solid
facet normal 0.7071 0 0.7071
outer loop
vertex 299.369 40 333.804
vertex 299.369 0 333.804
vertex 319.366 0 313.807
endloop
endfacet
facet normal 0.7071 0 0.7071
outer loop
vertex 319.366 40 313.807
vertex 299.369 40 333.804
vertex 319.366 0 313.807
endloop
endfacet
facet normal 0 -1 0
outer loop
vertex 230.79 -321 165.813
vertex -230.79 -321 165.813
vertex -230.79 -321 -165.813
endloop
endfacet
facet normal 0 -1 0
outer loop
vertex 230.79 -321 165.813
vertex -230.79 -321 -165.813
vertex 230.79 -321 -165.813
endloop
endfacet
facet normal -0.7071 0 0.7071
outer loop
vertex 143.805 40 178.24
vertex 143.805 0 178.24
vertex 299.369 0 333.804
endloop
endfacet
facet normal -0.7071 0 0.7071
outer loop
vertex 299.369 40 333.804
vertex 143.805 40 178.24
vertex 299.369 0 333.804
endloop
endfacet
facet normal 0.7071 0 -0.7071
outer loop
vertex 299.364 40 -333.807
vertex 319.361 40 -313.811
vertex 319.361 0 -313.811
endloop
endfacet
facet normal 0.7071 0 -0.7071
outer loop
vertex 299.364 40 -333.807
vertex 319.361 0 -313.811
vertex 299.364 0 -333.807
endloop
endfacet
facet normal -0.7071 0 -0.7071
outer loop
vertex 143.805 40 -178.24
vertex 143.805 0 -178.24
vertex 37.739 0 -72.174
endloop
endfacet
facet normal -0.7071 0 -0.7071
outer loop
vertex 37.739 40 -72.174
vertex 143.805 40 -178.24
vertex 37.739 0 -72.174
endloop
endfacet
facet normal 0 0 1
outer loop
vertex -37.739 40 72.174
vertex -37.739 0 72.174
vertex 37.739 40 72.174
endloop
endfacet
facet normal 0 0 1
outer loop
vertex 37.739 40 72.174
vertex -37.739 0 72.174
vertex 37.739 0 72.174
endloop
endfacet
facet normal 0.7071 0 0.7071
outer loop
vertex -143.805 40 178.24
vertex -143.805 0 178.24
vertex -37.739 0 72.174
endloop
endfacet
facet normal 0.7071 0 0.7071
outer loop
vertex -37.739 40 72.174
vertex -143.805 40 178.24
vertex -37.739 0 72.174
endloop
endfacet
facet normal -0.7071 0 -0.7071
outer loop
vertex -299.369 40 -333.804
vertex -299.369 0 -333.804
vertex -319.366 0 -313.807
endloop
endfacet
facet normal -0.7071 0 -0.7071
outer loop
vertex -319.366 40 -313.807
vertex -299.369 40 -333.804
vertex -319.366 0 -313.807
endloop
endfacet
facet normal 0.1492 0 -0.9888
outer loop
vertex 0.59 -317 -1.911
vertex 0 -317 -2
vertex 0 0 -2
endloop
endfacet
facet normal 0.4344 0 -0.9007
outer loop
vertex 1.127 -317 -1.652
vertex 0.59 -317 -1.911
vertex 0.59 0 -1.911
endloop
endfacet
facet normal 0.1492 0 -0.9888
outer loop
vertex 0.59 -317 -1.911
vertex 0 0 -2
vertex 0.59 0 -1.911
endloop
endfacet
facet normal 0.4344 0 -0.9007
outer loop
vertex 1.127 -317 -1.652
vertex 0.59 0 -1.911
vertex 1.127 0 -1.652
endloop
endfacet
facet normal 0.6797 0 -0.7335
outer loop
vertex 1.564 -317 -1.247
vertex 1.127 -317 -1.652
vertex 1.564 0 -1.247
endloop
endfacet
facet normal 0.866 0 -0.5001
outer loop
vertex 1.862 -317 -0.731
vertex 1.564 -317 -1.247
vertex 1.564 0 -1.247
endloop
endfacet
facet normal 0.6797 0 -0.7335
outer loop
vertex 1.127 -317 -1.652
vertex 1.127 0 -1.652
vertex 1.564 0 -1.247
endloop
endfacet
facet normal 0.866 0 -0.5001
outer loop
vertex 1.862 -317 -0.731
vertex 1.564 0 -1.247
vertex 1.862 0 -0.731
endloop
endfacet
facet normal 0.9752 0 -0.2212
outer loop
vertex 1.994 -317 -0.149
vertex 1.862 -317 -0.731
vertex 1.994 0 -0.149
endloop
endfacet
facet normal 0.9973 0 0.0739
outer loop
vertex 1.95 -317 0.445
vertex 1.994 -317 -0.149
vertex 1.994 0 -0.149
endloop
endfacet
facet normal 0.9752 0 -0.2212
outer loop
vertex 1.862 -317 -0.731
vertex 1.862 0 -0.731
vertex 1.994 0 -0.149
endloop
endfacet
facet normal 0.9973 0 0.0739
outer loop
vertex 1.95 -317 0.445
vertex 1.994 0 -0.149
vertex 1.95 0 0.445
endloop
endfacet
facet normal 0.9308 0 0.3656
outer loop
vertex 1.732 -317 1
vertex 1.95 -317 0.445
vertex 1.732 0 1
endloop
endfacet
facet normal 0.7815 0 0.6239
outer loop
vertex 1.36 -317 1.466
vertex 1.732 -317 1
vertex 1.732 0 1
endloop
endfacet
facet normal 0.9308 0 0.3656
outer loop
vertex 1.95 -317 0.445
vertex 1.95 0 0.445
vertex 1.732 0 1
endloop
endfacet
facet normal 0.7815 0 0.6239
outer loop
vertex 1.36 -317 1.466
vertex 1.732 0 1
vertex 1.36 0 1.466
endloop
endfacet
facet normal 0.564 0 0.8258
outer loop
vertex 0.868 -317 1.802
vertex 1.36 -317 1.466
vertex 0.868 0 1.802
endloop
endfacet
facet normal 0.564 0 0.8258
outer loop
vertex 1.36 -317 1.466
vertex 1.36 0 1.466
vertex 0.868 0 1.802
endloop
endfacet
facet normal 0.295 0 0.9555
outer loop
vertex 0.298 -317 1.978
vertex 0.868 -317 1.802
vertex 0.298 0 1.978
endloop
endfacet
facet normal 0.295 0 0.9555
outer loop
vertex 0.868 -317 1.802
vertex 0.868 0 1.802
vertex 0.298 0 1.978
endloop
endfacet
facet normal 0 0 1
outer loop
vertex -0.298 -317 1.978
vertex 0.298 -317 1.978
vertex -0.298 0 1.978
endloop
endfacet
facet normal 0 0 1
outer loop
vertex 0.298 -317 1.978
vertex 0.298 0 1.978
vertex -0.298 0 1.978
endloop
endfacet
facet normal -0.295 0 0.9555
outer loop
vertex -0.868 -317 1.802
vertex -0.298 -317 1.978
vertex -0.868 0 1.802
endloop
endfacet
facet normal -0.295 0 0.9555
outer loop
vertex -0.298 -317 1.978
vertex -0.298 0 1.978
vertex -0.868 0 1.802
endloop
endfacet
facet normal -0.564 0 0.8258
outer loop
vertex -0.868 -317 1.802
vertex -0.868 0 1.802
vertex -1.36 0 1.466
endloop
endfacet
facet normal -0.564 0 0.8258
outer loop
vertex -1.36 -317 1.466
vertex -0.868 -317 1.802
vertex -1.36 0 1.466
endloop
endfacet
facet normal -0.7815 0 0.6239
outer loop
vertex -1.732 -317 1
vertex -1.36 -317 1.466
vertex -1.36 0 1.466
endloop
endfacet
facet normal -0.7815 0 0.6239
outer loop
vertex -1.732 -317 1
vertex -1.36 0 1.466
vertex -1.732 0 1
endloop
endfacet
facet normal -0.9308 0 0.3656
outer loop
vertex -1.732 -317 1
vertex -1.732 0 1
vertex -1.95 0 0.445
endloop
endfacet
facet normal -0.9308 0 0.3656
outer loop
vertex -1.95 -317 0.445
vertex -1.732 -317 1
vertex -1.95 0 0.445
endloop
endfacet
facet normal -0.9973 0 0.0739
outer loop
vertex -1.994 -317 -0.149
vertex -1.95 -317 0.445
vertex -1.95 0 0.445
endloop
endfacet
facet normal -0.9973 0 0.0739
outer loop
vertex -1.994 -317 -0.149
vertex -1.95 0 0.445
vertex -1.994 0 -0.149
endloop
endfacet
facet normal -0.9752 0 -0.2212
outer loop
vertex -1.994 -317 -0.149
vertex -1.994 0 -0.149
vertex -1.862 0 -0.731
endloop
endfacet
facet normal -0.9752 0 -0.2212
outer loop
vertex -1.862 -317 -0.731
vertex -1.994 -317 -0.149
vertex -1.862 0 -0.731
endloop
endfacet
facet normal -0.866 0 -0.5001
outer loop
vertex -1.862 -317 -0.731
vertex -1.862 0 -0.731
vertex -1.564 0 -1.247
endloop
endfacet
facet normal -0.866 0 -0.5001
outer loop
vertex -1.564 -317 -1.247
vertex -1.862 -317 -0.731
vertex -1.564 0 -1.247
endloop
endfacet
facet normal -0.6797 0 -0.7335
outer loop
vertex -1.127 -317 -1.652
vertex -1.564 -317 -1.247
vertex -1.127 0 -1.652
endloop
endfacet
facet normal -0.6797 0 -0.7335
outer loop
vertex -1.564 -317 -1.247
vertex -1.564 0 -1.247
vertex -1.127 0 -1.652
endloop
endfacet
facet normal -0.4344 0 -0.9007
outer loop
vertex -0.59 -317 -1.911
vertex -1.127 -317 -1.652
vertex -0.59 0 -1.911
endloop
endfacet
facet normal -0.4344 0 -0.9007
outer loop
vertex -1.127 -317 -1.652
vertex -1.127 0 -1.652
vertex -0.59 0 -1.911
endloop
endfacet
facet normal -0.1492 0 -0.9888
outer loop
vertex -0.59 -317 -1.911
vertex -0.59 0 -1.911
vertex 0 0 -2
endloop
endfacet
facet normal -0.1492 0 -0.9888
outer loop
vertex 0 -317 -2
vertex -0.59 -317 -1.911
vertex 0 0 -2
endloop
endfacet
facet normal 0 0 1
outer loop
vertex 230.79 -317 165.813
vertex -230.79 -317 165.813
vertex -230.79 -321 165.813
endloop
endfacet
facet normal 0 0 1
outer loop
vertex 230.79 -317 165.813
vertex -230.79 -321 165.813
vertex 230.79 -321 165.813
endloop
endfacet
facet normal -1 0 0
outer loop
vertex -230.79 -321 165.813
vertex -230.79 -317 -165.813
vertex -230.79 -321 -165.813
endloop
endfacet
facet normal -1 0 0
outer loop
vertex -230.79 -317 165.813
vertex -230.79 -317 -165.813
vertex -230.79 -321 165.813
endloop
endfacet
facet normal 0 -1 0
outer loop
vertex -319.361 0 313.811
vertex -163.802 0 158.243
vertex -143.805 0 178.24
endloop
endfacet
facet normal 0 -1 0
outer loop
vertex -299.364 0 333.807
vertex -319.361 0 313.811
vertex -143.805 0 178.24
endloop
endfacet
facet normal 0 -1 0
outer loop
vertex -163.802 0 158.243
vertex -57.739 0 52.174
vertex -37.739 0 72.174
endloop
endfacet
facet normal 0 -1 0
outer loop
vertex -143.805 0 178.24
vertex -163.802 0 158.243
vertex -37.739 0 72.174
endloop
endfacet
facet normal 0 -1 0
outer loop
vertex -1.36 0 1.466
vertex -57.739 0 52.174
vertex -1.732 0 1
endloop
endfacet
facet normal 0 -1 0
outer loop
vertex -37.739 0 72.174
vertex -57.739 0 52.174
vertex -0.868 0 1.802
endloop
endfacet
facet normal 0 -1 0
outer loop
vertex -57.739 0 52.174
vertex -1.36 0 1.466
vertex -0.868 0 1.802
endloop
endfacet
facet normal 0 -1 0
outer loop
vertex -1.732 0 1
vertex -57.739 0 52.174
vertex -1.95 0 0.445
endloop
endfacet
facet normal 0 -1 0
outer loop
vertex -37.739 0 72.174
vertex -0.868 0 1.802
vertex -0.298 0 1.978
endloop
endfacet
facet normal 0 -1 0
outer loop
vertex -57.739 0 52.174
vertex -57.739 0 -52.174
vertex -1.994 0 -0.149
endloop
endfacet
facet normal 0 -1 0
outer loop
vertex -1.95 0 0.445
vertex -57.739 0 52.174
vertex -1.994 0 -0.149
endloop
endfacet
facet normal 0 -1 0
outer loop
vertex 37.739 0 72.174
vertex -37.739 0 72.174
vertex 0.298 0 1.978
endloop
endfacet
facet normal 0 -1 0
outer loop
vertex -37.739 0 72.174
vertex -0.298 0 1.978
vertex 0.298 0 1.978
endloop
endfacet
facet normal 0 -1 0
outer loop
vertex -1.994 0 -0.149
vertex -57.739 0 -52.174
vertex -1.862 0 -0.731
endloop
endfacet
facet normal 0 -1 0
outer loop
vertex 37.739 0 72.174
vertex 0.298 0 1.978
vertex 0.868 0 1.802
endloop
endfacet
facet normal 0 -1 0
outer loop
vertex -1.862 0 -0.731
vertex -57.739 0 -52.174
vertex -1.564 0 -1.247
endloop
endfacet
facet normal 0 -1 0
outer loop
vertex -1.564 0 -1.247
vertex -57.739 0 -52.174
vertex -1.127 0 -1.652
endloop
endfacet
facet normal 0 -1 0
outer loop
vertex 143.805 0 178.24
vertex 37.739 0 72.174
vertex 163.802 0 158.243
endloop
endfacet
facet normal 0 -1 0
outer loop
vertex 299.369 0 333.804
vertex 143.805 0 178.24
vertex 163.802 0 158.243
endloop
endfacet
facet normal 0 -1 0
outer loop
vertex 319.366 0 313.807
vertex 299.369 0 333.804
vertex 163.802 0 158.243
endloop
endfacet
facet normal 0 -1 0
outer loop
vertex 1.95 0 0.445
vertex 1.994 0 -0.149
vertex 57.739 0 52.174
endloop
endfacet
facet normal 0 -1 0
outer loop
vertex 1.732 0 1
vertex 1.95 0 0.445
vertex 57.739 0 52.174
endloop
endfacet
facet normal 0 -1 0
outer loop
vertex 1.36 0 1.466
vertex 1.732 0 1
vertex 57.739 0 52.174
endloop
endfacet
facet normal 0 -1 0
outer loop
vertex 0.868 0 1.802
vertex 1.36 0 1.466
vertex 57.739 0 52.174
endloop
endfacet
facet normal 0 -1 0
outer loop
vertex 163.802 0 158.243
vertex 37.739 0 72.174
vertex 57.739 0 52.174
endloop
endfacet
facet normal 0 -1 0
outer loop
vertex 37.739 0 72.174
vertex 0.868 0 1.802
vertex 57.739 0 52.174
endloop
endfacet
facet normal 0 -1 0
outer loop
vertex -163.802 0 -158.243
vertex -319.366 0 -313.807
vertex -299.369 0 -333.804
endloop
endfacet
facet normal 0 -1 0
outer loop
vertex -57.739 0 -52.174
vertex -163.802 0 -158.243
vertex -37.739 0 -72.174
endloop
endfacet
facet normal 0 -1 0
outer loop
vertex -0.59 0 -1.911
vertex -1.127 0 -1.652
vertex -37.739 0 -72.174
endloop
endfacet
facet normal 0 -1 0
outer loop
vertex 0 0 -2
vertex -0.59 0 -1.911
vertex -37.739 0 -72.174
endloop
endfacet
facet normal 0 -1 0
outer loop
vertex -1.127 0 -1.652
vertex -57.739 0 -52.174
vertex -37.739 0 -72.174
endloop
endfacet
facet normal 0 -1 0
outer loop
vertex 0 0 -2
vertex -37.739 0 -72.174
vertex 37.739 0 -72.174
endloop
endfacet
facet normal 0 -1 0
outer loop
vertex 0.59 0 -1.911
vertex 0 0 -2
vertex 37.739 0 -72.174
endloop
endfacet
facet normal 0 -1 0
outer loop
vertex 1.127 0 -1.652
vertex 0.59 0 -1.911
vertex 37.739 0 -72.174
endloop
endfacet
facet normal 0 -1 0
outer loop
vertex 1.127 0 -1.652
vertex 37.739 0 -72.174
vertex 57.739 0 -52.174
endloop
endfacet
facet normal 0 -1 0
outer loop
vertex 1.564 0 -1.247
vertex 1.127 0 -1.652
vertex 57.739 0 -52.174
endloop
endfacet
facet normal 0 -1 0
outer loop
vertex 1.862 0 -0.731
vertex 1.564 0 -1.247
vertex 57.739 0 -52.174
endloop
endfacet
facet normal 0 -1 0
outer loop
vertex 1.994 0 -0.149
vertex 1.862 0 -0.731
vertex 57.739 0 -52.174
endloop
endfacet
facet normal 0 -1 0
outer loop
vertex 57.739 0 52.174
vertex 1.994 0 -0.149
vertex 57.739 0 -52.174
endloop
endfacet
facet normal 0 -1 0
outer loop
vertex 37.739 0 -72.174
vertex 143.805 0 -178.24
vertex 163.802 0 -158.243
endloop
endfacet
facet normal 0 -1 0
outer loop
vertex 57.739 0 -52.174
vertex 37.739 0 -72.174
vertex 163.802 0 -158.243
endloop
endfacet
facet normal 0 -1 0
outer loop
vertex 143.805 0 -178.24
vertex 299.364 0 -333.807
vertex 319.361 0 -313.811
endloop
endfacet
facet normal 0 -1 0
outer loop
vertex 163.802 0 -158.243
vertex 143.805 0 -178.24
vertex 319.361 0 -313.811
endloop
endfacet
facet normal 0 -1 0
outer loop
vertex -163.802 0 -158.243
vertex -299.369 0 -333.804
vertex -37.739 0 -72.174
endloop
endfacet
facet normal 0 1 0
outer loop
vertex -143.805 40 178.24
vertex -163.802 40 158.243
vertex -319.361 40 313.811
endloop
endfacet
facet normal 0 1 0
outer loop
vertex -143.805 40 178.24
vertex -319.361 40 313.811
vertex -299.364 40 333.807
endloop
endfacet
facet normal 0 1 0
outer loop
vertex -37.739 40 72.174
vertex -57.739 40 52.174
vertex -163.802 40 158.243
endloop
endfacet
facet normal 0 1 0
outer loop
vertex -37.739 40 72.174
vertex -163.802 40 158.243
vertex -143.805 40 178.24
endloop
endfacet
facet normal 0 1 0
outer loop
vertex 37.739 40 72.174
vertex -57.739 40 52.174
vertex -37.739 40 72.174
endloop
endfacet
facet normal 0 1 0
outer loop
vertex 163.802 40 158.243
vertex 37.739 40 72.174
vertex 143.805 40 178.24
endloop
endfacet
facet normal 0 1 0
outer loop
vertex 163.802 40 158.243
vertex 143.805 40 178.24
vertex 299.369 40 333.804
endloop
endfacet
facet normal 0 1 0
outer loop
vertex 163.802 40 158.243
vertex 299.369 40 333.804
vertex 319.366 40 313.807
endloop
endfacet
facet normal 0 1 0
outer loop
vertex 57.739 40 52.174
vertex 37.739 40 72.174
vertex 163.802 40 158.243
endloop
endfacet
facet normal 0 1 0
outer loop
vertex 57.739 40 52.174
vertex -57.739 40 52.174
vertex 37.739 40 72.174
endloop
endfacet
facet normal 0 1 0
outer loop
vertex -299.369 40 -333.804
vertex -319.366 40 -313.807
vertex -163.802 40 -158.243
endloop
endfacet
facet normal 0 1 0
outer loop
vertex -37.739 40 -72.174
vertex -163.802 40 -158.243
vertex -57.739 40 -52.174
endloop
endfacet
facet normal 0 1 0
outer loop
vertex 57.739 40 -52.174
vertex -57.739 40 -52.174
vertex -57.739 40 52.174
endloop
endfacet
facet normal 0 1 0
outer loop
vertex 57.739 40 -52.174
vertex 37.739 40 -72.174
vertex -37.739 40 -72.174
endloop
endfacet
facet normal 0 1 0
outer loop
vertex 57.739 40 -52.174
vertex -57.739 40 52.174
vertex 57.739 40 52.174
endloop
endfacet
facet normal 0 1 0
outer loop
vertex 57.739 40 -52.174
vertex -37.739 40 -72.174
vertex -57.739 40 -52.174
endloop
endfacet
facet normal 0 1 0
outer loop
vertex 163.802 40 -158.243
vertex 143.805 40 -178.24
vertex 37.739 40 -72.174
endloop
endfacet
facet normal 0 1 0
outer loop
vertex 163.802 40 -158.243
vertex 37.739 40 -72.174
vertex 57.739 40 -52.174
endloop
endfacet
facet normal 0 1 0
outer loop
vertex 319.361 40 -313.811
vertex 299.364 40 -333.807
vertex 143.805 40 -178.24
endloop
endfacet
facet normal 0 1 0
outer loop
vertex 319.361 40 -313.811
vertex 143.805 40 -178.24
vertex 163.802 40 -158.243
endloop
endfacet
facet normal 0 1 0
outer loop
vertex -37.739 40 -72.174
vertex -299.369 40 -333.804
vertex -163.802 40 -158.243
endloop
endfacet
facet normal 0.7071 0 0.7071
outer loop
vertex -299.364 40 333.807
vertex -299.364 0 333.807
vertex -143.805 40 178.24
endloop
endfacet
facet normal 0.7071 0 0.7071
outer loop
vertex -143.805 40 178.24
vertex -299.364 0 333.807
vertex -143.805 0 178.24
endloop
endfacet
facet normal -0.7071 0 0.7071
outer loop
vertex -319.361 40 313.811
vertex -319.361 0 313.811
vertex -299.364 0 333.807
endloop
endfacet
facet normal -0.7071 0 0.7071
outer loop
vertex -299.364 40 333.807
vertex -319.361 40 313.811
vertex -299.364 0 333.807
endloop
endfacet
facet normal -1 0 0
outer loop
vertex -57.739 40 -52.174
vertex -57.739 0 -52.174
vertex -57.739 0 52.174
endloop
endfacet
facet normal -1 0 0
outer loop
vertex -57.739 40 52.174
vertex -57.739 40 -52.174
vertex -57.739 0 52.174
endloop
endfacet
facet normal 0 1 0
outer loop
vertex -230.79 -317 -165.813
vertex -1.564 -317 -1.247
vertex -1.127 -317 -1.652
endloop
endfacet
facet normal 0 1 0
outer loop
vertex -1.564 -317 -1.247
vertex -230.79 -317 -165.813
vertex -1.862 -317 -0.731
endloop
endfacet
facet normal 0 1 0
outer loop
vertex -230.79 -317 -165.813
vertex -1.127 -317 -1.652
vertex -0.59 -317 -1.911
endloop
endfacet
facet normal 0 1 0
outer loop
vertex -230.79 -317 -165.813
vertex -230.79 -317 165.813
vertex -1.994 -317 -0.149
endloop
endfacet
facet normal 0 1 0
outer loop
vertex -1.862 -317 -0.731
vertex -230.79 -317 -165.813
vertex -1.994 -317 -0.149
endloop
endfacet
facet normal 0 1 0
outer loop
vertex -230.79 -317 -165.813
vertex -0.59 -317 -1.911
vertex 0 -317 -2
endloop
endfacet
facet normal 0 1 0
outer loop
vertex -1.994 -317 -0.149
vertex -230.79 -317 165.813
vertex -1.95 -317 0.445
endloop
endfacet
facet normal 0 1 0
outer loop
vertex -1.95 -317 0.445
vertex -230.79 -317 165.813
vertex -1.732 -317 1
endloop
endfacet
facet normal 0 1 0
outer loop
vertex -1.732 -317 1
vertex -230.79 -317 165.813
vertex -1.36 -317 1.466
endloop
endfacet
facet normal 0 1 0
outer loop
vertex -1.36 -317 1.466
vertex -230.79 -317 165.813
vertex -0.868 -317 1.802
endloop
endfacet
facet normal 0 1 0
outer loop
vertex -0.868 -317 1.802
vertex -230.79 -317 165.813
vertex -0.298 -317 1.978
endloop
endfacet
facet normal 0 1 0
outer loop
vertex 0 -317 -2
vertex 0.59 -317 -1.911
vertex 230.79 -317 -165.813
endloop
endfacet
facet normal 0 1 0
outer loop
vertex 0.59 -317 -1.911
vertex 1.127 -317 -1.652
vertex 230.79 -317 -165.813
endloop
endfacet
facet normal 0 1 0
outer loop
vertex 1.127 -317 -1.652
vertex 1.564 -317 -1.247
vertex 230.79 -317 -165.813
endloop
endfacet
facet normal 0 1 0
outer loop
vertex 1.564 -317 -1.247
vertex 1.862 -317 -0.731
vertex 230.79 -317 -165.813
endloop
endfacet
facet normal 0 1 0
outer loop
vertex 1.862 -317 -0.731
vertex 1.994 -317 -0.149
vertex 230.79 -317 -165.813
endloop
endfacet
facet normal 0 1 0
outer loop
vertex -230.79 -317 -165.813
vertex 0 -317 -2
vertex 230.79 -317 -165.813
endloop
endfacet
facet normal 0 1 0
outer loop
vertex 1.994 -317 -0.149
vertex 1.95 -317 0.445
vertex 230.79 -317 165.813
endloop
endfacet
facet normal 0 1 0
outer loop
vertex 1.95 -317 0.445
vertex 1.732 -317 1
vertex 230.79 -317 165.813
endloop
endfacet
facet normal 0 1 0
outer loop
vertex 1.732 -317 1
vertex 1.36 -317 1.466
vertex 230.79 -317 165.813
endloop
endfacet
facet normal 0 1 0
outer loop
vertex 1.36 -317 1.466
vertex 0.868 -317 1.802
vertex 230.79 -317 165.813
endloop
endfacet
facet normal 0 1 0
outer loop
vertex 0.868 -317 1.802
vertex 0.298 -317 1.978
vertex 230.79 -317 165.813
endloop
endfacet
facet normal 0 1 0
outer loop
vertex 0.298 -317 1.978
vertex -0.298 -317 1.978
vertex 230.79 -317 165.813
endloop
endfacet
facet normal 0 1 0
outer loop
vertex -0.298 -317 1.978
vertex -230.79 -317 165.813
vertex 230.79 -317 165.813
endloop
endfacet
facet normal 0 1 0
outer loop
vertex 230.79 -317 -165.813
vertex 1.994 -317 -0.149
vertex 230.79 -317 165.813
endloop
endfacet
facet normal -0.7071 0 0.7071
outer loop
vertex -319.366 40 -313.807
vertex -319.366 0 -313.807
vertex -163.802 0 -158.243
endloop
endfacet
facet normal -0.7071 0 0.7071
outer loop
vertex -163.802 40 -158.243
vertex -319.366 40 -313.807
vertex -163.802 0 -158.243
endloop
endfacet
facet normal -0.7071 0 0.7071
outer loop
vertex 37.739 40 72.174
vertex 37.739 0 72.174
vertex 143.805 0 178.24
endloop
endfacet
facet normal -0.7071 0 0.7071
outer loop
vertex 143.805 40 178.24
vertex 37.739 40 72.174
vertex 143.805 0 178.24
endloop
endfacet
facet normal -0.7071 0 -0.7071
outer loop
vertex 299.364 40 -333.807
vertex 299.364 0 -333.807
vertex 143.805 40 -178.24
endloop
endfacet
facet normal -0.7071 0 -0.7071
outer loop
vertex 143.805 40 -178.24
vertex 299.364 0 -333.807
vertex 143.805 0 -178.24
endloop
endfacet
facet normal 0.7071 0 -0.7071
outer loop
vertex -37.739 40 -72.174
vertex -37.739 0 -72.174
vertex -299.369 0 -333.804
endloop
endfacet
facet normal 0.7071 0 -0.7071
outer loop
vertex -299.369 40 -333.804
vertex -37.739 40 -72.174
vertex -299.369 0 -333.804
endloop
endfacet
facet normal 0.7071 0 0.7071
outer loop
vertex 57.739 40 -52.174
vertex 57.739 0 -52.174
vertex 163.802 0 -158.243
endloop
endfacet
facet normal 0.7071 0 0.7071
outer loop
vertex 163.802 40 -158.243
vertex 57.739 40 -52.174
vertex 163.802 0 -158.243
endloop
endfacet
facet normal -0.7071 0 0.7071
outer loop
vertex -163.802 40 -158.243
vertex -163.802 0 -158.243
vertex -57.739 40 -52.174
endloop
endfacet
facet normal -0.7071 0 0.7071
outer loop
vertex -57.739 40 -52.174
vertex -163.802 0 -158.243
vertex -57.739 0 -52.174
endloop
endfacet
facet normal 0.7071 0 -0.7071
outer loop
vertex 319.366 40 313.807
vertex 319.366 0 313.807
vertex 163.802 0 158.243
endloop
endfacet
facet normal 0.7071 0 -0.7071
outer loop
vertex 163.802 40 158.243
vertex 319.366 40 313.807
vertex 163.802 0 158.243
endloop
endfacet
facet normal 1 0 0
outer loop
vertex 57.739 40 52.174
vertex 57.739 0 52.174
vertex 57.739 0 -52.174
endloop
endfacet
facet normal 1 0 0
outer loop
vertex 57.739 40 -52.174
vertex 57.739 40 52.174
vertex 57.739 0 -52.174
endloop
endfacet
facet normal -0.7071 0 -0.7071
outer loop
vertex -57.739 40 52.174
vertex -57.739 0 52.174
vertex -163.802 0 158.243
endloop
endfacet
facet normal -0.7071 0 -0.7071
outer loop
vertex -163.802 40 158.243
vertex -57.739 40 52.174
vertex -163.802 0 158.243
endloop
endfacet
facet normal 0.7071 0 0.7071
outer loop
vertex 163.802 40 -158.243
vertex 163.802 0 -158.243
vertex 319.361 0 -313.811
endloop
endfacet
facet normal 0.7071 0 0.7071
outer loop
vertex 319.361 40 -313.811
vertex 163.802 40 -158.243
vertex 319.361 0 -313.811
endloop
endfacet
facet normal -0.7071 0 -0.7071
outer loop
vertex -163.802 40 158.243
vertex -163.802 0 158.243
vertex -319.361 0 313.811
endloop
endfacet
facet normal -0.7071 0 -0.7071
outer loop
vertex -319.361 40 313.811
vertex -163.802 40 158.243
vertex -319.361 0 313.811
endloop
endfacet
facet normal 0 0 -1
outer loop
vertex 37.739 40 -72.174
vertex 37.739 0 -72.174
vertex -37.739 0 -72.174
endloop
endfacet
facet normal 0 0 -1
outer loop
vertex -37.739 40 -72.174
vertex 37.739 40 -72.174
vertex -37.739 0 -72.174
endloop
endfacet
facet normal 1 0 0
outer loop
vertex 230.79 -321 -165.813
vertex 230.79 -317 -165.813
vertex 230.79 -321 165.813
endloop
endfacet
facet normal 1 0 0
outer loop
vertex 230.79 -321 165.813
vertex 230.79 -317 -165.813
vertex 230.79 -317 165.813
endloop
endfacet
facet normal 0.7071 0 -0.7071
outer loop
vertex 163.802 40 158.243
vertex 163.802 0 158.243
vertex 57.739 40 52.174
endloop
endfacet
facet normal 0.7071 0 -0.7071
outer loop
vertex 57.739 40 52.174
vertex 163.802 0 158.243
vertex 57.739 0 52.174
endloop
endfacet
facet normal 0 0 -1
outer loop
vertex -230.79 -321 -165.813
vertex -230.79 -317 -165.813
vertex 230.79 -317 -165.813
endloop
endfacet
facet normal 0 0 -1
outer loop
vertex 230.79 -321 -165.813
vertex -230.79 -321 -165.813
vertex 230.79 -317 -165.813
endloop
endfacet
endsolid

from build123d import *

# Parameters (mm, degrees)
BOSS_EXTRUDE1_DEPTH = 40
SKETCH2_R           = 2
BOSS_EXTRUDE2_DEPTH = 317
SKETCH3_W           = 461.580426742
SKETCH3_H           = 331.625976184
BOSS_EXTRUDE3_DEPTH = 4


with BuildPart() as part:
    # Sketch1 → Boss-Extrude1 (new body)
    with BuildSketch(Plane(origin=(0, 0, 0), x_dir=(1, 0, 0), z_dir=(0, 1, 0))):
        Polygon((-37.739281915, 72.174102179), (-143.805299093, 178.240119357), (-299.368790954, 333.803611218), (-319.365770726, 313.806631446), (-163.802279668, 158.243140388), (-57.739282705, 52.174103081), (-57.739282705, -52.174103272), (-163.80227984, -158.243140407), (-319.361342305, -313.811061538), (-299.36379317, -333.807471931), (-143.805300025, -178.240120135), (-37.739282847, -72.174102957), (37.739282893, -72.174102957), (143.805300071, -178.240120135), (299.368791932, -333.803611997), (319.365771704, -313.806632225), (163.802280352, -158.243140872), (57.739283379, -52.174103575), (57.739283379, 52.174102471), (163.802280509, 158.243139611), (319.361342965, 313.811060751), (299.36379383, 333.807471143), (143.805300678, 178.240119357), (37.7392835, 72.174102179), align=None)
    extrude(amount=BOSS_EXTRUDE1_DEPTH)

    # Sketch2 → Boss-Extrude2 (add)
    with BuildSketch(Plane(origin=(0, 0, 0), x_dir=(-1, 0, 0), z_dir=(0, -1, 0))):
        with Locations(Location((0, 0, 0), (0, 0, 90))):
            Circle(SKETCH2_R)
    extrude(amount=BOSS_EXTRUDE2_DEPTH)

    # Sketch3 → Boss-Extrude3 (add)
    with BuildSketch(Plane.XZ.offset(317)):
        Rectangle(SKETCH3_W, SKETCH3_H)
    extrude(amount=BOSS_EXTRUDE3_DEPTH)


solid = part.part
